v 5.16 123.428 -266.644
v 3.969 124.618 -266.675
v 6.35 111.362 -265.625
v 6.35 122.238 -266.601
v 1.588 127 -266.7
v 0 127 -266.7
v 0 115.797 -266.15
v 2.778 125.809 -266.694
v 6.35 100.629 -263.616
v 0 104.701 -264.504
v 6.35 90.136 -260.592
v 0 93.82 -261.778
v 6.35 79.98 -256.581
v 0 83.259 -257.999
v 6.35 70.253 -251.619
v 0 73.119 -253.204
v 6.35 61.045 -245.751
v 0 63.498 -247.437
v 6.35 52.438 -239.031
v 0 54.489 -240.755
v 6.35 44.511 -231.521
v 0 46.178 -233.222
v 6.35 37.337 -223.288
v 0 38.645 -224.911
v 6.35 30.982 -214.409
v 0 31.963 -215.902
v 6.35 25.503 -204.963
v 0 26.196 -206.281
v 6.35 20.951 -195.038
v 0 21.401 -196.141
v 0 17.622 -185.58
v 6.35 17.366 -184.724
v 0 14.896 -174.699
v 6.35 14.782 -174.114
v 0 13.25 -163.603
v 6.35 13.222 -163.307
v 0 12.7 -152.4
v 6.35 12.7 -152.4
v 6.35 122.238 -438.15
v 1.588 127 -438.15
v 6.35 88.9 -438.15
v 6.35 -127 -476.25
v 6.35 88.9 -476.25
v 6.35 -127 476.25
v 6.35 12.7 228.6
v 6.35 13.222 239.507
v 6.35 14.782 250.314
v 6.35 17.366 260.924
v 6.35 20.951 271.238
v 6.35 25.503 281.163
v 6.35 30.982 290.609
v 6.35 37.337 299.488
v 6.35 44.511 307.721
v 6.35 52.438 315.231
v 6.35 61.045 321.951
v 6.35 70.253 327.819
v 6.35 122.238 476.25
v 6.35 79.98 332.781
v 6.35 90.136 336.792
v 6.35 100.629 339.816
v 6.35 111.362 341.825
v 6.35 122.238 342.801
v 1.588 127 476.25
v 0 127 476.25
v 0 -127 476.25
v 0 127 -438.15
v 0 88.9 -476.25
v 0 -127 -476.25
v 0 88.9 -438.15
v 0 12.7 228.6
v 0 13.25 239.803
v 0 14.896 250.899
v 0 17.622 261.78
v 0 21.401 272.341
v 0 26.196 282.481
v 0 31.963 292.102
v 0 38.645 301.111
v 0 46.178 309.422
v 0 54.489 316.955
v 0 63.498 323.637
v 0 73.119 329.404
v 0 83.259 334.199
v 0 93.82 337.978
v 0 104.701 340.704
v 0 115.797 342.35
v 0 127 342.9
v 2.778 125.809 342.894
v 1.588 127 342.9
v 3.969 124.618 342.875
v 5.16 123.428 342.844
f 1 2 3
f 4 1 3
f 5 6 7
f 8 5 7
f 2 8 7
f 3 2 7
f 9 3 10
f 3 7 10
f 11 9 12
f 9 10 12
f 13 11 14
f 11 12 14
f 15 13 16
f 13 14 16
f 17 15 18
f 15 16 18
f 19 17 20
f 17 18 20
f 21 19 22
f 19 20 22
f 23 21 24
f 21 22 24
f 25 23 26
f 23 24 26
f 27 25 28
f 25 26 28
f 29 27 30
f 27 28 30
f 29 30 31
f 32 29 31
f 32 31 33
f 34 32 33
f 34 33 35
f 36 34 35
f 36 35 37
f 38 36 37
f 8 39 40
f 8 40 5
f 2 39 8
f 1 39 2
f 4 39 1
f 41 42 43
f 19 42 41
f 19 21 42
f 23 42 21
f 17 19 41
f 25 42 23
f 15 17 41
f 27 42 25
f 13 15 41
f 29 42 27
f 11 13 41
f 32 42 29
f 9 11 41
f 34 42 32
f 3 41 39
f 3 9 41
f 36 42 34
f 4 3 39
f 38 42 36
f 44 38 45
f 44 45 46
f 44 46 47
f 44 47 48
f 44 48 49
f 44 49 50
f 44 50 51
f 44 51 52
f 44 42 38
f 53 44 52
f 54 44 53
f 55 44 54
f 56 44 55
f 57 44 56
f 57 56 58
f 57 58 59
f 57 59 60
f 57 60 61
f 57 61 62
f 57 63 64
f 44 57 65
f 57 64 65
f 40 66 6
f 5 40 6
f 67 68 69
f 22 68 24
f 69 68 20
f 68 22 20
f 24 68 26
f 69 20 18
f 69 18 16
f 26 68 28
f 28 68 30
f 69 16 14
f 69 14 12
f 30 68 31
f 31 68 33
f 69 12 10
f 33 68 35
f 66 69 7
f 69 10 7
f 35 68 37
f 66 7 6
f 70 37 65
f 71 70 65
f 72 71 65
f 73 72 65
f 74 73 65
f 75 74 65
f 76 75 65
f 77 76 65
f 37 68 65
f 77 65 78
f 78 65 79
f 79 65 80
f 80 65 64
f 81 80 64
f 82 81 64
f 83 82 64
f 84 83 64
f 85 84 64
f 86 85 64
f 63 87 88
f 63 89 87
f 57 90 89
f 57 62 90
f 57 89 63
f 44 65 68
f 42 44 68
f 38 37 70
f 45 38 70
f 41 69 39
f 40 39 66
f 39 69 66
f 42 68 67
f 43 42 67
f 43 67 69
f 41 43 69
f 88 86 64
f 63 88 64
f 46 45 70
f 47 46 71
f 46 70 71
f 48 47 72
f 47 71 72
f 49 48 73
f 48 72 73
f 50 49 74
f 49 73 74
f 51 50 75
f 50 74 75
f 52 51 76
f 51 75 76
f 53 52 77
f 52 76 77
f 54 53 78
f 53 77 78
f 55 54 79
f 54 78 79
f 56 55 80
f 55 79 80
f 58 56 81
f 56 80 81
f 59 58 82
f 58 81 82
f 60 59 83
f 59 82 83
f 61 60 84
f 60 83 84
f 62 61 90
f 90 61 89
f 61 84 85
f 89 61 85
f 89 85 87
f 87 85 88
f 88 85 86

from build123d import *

# Parameters (mm, degrees)
F1_DEPTH = 6.35
F2_SIZE  = 4.7625


with BuildPart() as f1:
    # F0 (on Right) → F1 (new body)
    with BuildSketch(Plane.YZ):
        with BuildLine():
            Line((127, 476.25), (-127, 476.25))
            Line((-127, 476.25), (-127, -476.25))
            Line((-127, -476.25), (88.9, -476.25))
            Line((88.9, -476.25), (88.9, -438.15))
            Line((88.9, -438.15), (127, -438.15))
            Line((127, -438.15), (127, -266.7))
            ThreePointArc((127, -266.7), (46.177695, -233.222305), (12.7, -152.4))
            Line((12.7, -152.4), (12.7, 228.6))
            ThreePointArc((12.7, 228.6), (46.177695, 309.422305), (127, 342.9))
            Line((127, 342.9), (127, 476.25))
        make_face()
    extrude(amount=F1_DEPTH)

    # F2
    f2_edges = [f1.edges().sort_by_distance(p)[0] for p in [
        (6.35, 127, 409.575),
        (6.35, 127, -352.425),
    ]]
    chamfer(f2_edges, length=F2_SIZE)


solid = f1.part
